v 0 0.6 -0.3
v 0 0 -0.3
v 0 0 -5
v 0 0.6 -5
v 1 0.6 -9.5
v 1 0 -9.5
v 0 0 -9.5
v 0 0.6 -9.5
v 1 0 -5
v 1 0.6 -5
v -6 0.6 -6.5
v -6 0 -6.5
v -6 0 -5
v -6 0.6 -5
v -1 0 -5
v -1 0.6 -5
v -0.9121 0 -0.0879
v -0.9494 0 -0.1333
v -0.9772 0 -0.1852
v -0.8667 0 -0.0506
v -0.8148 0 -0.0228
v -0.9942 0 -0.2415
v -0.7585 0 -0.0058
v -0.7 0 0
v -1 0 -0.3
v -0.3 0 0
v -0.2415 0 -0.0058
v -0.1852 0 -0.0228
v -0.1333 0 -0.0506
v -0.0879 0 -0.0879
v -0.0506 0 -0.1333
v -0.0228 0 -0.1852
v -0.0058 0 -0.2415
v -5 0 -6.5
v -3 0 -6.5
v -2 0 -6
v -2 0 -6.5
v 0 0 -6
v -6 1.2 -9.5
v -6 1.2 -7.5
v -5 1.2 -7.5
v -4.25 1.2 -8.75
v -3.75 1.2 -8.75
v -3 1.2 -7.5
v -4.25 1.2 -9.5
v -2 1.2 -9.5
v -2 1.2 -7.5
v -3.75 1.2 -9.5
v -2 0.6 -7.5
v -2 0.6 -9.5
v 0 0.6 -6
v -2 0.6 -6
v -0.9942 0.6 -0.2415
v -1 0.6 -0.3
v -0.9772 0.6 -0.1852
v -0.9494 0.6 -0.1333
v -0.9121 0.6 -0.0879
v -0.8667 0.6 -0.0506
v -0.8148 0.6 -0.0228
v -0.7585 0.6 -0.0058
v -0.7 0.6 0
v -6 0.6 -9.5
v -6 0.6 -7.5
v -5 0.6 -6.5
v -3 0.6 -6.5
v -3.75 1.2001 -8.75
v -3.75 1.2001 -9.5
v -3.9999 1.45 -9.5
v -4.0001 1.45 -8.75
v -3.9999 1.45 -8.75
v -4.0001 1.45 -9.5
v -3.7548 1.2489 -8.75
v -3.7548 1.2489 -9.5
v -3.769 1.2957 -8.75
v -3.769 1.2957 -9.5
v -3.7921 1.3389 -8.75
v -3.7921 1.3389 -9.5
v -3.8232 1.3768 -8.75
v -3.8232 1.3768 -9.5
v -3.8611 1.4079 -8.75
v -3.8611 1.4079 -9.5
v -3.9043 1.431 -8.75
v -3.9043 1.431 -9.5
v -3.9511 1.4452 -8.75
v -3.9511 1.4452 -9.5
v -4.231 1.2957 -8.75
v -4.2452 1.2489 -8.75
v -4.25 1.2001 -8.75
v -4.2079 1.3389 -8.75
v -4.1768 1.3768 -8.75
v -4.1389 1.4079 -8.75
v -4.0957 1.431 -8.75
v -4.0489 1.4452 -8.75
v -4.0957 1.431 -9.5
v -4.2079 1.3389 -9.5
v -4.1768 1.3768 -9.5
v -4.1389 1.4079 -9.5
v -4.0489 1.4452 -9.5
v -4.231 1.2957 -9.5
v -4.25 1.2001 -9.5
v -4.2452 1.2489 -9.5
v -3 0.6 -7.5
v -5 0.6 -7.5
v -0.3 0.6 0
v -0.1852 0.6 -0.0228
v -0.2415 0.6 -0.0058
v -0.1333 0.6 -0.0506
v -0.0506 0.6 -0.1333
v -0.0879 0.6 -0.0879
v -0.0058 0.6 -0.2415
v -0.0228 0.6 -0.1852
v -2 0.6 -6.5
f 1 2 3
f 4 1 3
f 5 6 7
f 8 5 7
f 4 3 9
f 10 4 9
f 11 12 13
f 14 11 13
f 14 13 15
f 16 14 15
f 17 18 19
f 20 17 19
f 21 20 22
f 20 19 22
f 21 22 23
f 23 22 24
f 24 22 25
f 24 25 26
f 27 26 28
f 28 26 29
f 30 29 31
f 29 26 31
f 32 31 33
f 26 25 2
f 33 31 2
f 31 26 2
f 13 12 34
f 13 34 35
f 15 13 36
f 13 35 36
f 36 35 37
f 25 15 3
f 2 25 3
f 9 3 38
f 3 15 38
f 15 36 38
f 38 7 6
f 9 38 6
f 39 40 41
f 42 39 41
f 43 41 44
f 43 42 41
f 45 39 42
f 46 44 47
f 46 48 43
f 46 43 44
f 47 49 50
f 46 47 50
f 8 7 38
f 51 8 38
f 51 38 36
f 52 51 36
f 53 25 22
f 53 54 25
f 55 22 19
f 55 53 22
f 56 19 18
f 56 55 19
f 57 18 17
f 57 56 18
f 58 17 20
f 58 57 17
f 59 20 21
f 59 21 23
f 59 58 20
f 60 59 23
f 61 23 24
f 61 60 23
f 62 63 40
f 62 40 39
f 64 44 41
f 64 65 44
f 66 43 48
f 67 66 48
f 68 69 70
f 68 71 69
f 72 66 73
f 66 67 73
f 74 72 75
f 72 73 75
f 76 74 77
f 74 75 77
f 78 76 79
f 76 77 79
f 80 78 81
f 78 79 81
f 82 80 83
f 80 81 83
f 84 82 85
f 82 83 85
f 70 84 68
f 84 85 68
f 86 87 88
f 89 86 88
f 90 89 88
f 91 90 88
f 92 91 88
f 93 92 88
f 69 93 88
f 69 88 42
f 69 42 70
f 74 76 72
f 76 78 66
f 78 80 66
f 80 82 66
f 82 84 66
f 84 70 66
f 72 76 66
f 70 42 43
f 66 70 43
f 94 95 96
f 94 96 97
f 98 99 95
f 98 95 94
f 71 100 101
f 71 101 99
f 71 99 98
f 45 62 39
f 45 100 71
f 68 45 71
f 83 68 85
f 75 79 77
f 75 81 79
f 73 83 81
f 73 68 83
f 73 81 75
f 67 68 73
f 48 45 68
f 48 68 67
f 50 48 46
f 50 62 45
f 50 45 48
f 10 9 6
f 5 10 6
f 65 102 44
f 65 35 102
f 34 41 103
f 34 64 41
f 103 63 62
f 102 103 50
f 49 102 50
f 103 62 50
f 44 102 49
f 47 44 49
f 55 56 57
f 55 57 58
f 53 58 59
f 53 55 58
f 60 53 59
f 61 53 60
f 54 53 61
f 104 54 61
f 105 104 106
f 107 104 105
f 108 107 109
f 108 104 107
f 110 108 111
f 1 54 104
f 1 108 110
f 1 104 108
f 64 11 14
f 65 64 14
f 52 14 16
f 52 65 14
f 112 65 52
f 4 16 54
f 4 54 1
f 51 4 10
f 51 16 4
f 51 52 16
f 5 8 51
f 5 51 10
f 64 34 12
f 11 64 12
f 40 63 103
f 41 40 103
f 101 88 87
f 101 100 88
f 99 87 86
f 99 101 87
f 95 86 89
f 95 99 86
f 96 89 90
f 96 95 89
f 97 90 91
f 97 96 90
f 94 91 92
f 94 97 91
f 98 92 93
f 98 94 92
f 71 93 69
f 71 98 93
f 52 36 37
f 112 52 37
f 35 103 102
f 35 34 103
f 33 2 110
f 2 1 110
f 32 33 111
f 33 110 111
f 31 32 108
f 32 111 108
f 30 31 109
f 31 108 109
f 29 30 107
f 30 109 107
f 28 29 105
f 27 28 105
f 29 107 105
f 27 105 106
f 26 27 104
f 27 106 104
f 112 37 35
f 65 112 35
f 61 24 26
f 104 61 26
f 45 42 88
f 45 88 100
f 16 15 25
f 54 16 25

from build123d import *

# Parameters (mm, degrees)
BOSS_EXTRUDE1_DEPTH = 0.6
SKETCH2_W           = 4
SKETCH2_H           = 2
BOSS_EXTRUDE2_DEPTH = 0.6
FILLET1_R           = 0.3
SKETCH5_W           = 0.5
SKETCH5_H           = 0.75
BOSS_EXTRUDE3_DEPTH = 0.25
FILLET2_R           = 0.25


with BuildPart() as part:
    # Sketch1 → Boss-Extrude1 (new body)
    with BuildSketch(Plane(origin=(0, 0, 0), x_dir=(1, 0, 0), z_dir=(0, 1, 0))):
        Polygon((0, 0), (0, 5), (1, 5), (1, 9.5), (0, 9.5), (0, 6), (-2, 6), (-2, 6.5), (-6, 6.5), (-6, 5), (-1, 5), (-1, 0), align=None)
    extrude(amount=BOSS_EXTRUDE1_DEPTH)



with BuildPart() as body_2:
    # Sketch2 → Boss-Extrude2 (new body)
    with BuildSketch(Plane(origin=(0, 0.6, 0), x_dir=(1, 0, 0), z_dir=(0, 1, 0))):
        with Locations((-4, 8.5)):
            Rectangle(SKETCH2_W, SKETCH2_H)
    extrude(amount=BOSS_EXTRUDE2_DEPTH)


with BuildPart() as part_1:
    add(part.part)

    add(body_2.part)  # Loft1 merges body 2
    # Sketch3 → Loft1 section 0
    with BuildSketch(Plane.XY.offset(-7.5)):
        with BuildLine():
            Line((-3, 1.2), (-5, 1.2))
            Line((-5, 1.2), (-5, 0.6))
            Line((-5, 0.6), (-3, 0.6))
            Line((-3, 0.6), (-3, 1.2))
        make_face()
    # Sketch4 → Loft1 section 1
    with BuildSketch(Plane(origin=(0, 0, -6.5), x_dir=(-1, 0, 0), z_dir=(0, 0, -1))):
        with BuildLine():
            Line((3, 0.6), (5, 0.6))
            Line((5, 0.6), (5, 0))
            Line((5, 0), (3, 0))
            Line((3, 0), (3, 0.6))
        make_face()
    loft()

    # Fillet1
    fillet1_edges = [part_1.edges().sort_by_distance(p)[0] for p in [
        (-1, 0.3, 0),
        (0, 0.3, 0),
    ]]
    fillet(fillet1_edges, radius=FILLET1_R)

    # Sketch5 → Boss-Extrude3 (add)
    with BuildSketch(Plane(origin=(0, 1.2, 0), x_dir=(1, 0, 0), z_dir=(0, 1, 0))):
        with Locations((-4, 9.125)):
            Rectangle(SKETCH5_W, SKETCH5_H)
    extrude(amount=BOSS_EXTRUDE3_DEPTH)

    # Fillet2
    fillet2_edges = [part_1.edges().sort_by_distance(p)[0] for p in [
        (-3.75, 1.45, -9.125),
        (-4.25, 1.45, -9.125),
    ]]
    fillet(fillet2_edges, radius=FILLET2_R - 0.0001)  # a hair under: the kernel refuses the full size


solid = part_1.part
